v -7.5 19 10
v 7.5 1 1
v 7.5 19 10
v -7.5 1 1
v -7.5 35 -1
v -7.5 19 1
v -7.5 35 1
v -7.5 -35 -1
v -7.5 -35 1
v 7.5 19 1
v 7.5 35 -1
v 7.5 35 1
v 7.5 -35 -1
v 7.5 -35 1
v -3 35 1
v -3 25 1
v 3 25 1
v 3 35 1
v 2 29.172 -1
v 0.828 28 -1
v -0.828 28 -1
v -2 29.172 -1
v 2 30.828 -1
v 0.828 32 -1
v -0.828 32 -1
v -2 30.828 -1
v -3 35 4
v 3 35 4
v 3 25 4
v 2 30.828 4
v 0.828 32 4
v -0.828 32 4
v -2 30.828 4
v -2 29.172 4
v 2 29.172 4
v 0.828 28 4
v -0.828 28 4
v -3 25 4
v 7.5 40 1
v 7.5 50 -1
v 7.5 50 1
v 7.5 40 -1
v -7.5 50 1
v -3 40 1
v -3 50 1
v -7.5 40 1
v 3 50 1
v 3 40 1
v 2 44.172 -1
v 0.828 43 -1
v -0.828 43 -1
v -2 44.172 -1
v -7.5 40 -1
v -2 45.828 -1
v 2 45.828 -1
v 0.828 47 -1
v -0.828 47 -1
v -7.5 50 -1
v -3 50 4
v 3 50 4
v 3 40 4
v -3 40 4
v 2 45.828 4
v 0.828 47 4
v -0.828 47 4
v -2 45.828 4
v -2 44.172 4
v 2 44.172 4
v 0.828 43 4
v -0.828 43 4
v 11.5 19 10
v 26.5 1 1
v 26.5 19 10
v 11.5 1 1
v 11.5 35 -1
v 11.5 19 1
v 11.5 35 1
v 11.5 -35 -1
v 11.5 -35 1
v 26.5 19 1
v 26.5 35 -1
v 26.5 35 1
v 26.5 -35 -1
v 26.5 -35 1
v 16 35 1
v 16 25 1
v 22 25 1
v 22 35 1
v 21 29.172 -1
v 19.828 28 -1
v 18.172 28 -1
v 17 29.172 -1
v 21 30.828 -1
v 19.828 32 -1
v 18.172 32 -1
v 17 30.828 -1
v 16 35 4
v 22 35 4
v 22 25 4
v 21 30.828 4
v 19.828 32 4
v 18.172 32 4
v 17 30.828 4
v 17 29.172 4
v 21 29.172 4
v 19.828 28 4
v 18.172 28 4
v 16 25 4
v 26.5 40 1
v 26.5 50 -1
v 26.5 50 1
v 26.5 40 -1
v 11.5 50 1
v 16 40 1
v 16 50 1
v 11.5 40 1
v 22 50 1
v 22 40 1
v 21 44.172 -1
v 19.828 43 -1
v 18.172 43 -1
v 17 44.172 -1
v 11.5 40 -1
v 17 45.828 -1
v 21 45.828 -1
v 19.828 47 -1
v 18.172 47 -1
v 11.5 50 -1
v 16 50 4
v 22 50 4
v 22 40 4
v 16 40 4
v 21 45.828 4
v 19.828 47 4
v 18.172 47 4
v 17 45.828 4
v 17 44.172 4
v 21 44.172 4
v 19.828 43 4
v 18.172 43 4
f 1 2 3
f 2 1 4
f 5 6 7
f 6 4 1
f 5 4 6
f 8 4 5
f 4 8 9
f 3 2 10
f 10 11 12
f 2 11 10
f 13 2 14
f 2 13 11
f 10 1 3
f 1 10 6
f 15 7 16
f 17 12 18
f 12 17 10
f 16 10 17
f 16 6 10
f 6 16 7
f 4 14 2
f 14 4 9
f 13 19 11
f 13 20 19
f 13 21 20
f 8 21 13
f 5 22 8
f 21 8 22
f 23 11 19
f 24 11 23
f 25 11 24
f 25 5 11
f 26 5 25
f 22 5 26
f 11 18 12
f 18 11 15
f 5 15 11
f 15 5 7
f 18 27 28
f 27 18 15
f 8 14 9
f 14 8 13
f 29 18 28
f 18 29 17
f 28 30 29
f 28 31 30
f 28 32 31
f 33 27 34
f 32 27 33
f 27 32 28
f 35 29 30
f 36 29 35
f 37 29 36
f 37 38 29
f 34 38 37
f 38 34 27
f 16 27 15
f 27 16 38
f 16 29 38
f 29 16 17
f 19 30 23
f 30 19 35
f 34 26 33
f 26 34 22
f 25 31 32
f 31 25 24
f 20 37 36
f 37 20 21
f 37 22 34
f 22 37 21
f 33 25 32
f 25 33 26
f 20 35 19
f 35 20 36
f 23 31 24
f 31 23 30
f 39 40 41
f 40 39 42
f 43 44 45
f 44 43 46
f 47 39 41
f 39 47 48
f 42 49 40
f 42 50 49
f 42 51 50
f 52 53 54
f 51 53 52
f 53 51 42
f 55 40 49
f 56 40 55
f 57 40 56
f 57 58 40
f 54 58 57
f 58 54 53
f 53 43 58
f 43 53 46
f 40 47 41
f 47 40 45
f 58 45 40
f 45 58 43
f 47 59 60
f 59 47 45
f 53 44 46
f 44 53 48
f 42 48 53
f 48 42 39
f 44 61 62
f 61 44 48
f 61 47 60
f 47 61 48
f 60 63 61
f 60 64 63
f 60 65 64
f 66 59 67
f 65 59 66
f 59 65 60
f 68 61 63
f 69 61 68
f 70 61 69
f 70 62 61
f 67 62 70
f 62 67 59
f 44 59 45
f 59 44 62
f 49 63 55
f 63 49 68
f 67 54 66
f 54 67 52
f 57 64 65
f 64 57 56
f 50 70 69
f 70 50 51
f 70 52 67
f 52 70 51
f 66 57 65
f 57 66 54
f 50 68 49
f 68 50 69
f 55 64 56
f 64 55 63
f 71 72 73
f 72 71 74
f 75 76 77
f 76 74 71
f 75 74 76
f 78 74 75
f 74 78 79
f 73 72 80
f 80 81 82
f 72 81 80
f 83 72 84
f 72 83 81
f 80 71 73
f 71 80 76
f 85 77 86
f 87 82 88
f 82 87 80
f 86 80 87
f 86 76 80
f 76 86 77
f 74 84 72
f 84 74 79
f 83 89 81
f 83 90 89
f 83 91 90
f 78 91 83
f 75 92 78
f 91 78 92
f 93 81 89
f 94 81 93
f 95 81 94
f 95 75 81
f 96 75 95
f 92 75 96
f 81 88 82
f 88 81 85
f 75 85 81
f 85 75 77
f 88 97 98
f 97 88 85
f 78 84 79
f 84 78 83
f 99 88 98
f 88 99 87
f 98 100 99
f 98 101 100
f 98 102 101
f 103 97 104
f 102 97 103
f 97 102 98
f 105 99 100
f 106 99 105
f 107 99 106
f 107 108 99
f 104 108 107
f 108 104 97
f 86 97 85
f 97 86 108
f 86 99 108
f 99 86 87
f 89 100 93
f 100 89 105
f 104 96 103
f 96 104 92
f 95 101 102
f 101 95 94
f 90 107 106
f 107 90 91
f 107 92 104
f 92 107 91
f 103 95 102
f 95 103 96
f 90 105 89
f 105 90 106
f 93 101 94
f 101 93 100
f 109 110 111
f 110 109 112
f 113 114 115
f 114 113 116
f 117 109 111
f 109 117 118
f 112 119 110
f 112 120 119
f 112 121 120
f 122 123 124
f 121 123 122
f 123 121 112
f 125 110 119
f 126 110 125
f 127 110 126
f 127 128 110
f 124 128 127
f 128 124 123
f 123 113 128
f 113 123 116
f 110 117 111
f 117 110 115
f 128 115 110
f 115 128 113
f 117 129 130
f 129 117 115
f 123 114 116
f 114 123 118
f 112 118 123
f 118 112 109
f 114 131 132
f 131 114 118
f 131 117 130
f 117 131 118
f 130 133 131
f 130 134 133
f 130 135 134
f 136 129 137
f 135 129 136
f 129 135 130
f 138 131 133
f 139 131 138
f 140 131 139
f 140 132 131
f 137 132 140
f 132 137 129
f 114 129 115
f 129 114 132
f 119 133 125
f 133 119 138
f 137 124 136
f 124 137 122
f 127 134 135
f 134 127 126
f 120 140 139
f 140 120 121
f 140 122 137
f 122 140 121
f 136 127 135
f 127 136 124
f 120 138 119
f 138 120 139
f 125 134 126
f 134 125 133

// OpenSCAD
// file: shapes.scad
/*
 *  OpenSCAD Shapes Library (www.openscad.at)
 *  Copyright (C) 2009  Catarina Mota <clifford@clifford.at>
 *
 *  This program is free software; you can redistribute it and/or modify
 *  it under the terms of the GNU General Public License as published by
 *  the Free Software Foundation; either version 2 of the License, or
 *  (at your option) any later version.
 *
 *  This program is distributed in the hope that it will be useful,
 *  but WITHOUT ANY WARRANTY; without even the implied warranty of
 *  MERCHANTABILITY or FITNESS FOR A PARTICULAR PURPOSE.  See the
 *  GNU General Public License for more details.
 *
 *  You should have received a copy of the GNU General Public License
 *  along with this program; if not, write to the Free Software
 *  Foundation, Inc., 59 Temple Place, Suite 330, Boston, MA  02111-1307  USA
 *
*/


//box(width, height, depth);
//roundedBox(width, height, depth, factor);
//cone(height, radius);
//oval(width, height, depth);
//tube(height, radius, wall);
//ovalTube(width, height, depth, wall);
//hexagon(height, depth);
//octagon(height, depth);
//dodecagon(height, depth);
//hexagram(height, depth);
//rightTriangle(adjacent, opposite, depth);
//equiTriangle(side, depth);
//12ptStar(height, depth);

//----------------------

//roundedBox(120, 60, 3, 8);

//----------------------

module box(w,h,d) {
	scale ([w,h,d]) cube(1, true);
}

module roundedBox(w,h,d,f){
	difference(){
		box(w,h,d);
		translate([-w/2,h/2,0]) cube(w/(f/2),true);
		translate([w/2,h/2,0]) cube(w/(f/2),true);
		translate([-w/2,-h/2,0]) cube(w/(f/2),true);
		translate([w/2,-h/2,0]) cube(w/(f/2),true);
	}
	translate([-w/2+w/f,h/2-w/f,-d/2]) cylinder(d,w/f, w/f);
	translate([w/2-w/f,h/2-w/f,-d/2]) cylinder(d,w/f, w/f);
	translate([-w/2+w/f,-h/2+w/f,-d/2]) cylinder(d,w/f, w/f);
	translate([w/2-w/f,-h/2+w/f,-d/2]) cylinder(d,w/f, w/f);
}

module cone(height, radius) {
		cylinder(height, radius, 0);
}

module oval(w,h,d) {
	scale ([w/100, h/100, 1]) cylinder(d, 50, 50);
}

module tube(height, radius, wall) {
	difference(){
		cylinder(height, radius, radius);
		cylinder(height, radius-wall, radius-wall);
	}
}

module ovalTube(w,h,d,wall) {
	difference(){
		scale ([w/100, h/100, 1]) cylinder(d, 50, 50);
		scale ([w/100, h/100, 1]) cylinder(d, 50-wall, 50-wall);
	}
}

module hexagon(height, depth) {
	boxWidth=height/1.75;
		union(){
			box(boxWidth, height, depth);
			rotate([0,0,60]) box(boxWidth, height, depth);
			rotate([0,0,-60]) box(boxWidth, height, depth);
		}
}

module octagon(height, depth) {
	intersection(){
		box(height, height, depth);
		rotate([0,0,45]) box(height, height, depth);
	}
}

module dodecagon(height, depth) {
	intersection(){
		hexagon(height, depth);
		rotate([0,0,90]) hexagon(height, depth);
	}
}

module hexagram(height, depth) {
	boxWidth=height/1.75;
	intersection(){
		box(height, boxWidth, depth);
		rotate([0,0,60]) box(height, boxWidth, depth);
	}
	intersection(){
		box(height, boxWidth, depth);
		rotate([0,0,-60]) box(height, boxWidth, depth);
	}
	intersection(){
		rotate([0,0,60]) box(height, boxWidth, depth);
		rotate([0,0,-60]) box(height, boxWidth, depth);
	}
}

module rightTriangle(adjacent, opposite, depth) {
	difference(){
		translate([-adjacent/2,opposite/2,0]) box(adjacent, opposite, depth);
		translate([-adjacent,0,0]){
			rotate([0,0,atan(opposite/adjacent)]) dislocateBox(adjacent*4, opposite, depth);
		}
	}
}

module equiTriangle(side, depth) {
	difference(){
		translate([-side/2,side/2,0]) box(side, side, depth);
		rotate([0,0,30]) dislocateBox(side*2, side, depth);
		translate([-side,0,0]){
			rotate([0,0,60]) dislocateBox(side*2, side, depth);
		}
	}
}

module 12ptStar(height, depth) {
	starNum=3;
	starAngle=360/starNum;
	for (s=[1:starNum]){
		rotate([0, 0, s*starAngle]) box(height, height, depth);
	}
}

//-----------------------
//MOVES THE ROTATION AXIS OF A BOX FROM ITS CENTER TO THE BOTTOM LEFT CORNER
module dislocateBox(w,h,d){
	translate([w/2,h,0]){
		difference(){
			box(w, h*2, d+1);
			translate([-w,0,0]) box(w, h*2, d+1);
		}
	}
}
// main file
include <shapes.scad>  // using Catarina Mota's shapes library

screwsize=4;
length=70;
width=15;
middle=5;
height=2;
triangle_base=20;
triangle_height=10;
triangle_offset=16;
connector_width=6;
connector_height=4;
connector_length = 10;
set();
translate ([width+4,0,0]) set();

module set()
{
//base
difference ()
	{
	union ()
		{
		box(width, length, height);
		translate ([0,(length-connector_length)/2,height]) box(connector_width, connector_length, connector_height);
		translate ([0,length/2-triangle_offset,0]) rotate ([90,90,270]) rightTriangle(triangle_height, triangle_base, width);
		}
	translate ([0,(length-connector_length)/2,height/2]) octagon (screwsize,connector_height+height);
	}

//connector base
difference ()
	{
	union ()
		{
		translate ([0,length/2+connector_length,0]) box(width, connector_length, height);
		translate ([0,length/2+connector_length,height]) box(connector_width, connector_length, connector_height);
		}
	translate ([0,length/2+connector_length,height/2]) octagon (screwsize,connector_height+height);
	}
}
